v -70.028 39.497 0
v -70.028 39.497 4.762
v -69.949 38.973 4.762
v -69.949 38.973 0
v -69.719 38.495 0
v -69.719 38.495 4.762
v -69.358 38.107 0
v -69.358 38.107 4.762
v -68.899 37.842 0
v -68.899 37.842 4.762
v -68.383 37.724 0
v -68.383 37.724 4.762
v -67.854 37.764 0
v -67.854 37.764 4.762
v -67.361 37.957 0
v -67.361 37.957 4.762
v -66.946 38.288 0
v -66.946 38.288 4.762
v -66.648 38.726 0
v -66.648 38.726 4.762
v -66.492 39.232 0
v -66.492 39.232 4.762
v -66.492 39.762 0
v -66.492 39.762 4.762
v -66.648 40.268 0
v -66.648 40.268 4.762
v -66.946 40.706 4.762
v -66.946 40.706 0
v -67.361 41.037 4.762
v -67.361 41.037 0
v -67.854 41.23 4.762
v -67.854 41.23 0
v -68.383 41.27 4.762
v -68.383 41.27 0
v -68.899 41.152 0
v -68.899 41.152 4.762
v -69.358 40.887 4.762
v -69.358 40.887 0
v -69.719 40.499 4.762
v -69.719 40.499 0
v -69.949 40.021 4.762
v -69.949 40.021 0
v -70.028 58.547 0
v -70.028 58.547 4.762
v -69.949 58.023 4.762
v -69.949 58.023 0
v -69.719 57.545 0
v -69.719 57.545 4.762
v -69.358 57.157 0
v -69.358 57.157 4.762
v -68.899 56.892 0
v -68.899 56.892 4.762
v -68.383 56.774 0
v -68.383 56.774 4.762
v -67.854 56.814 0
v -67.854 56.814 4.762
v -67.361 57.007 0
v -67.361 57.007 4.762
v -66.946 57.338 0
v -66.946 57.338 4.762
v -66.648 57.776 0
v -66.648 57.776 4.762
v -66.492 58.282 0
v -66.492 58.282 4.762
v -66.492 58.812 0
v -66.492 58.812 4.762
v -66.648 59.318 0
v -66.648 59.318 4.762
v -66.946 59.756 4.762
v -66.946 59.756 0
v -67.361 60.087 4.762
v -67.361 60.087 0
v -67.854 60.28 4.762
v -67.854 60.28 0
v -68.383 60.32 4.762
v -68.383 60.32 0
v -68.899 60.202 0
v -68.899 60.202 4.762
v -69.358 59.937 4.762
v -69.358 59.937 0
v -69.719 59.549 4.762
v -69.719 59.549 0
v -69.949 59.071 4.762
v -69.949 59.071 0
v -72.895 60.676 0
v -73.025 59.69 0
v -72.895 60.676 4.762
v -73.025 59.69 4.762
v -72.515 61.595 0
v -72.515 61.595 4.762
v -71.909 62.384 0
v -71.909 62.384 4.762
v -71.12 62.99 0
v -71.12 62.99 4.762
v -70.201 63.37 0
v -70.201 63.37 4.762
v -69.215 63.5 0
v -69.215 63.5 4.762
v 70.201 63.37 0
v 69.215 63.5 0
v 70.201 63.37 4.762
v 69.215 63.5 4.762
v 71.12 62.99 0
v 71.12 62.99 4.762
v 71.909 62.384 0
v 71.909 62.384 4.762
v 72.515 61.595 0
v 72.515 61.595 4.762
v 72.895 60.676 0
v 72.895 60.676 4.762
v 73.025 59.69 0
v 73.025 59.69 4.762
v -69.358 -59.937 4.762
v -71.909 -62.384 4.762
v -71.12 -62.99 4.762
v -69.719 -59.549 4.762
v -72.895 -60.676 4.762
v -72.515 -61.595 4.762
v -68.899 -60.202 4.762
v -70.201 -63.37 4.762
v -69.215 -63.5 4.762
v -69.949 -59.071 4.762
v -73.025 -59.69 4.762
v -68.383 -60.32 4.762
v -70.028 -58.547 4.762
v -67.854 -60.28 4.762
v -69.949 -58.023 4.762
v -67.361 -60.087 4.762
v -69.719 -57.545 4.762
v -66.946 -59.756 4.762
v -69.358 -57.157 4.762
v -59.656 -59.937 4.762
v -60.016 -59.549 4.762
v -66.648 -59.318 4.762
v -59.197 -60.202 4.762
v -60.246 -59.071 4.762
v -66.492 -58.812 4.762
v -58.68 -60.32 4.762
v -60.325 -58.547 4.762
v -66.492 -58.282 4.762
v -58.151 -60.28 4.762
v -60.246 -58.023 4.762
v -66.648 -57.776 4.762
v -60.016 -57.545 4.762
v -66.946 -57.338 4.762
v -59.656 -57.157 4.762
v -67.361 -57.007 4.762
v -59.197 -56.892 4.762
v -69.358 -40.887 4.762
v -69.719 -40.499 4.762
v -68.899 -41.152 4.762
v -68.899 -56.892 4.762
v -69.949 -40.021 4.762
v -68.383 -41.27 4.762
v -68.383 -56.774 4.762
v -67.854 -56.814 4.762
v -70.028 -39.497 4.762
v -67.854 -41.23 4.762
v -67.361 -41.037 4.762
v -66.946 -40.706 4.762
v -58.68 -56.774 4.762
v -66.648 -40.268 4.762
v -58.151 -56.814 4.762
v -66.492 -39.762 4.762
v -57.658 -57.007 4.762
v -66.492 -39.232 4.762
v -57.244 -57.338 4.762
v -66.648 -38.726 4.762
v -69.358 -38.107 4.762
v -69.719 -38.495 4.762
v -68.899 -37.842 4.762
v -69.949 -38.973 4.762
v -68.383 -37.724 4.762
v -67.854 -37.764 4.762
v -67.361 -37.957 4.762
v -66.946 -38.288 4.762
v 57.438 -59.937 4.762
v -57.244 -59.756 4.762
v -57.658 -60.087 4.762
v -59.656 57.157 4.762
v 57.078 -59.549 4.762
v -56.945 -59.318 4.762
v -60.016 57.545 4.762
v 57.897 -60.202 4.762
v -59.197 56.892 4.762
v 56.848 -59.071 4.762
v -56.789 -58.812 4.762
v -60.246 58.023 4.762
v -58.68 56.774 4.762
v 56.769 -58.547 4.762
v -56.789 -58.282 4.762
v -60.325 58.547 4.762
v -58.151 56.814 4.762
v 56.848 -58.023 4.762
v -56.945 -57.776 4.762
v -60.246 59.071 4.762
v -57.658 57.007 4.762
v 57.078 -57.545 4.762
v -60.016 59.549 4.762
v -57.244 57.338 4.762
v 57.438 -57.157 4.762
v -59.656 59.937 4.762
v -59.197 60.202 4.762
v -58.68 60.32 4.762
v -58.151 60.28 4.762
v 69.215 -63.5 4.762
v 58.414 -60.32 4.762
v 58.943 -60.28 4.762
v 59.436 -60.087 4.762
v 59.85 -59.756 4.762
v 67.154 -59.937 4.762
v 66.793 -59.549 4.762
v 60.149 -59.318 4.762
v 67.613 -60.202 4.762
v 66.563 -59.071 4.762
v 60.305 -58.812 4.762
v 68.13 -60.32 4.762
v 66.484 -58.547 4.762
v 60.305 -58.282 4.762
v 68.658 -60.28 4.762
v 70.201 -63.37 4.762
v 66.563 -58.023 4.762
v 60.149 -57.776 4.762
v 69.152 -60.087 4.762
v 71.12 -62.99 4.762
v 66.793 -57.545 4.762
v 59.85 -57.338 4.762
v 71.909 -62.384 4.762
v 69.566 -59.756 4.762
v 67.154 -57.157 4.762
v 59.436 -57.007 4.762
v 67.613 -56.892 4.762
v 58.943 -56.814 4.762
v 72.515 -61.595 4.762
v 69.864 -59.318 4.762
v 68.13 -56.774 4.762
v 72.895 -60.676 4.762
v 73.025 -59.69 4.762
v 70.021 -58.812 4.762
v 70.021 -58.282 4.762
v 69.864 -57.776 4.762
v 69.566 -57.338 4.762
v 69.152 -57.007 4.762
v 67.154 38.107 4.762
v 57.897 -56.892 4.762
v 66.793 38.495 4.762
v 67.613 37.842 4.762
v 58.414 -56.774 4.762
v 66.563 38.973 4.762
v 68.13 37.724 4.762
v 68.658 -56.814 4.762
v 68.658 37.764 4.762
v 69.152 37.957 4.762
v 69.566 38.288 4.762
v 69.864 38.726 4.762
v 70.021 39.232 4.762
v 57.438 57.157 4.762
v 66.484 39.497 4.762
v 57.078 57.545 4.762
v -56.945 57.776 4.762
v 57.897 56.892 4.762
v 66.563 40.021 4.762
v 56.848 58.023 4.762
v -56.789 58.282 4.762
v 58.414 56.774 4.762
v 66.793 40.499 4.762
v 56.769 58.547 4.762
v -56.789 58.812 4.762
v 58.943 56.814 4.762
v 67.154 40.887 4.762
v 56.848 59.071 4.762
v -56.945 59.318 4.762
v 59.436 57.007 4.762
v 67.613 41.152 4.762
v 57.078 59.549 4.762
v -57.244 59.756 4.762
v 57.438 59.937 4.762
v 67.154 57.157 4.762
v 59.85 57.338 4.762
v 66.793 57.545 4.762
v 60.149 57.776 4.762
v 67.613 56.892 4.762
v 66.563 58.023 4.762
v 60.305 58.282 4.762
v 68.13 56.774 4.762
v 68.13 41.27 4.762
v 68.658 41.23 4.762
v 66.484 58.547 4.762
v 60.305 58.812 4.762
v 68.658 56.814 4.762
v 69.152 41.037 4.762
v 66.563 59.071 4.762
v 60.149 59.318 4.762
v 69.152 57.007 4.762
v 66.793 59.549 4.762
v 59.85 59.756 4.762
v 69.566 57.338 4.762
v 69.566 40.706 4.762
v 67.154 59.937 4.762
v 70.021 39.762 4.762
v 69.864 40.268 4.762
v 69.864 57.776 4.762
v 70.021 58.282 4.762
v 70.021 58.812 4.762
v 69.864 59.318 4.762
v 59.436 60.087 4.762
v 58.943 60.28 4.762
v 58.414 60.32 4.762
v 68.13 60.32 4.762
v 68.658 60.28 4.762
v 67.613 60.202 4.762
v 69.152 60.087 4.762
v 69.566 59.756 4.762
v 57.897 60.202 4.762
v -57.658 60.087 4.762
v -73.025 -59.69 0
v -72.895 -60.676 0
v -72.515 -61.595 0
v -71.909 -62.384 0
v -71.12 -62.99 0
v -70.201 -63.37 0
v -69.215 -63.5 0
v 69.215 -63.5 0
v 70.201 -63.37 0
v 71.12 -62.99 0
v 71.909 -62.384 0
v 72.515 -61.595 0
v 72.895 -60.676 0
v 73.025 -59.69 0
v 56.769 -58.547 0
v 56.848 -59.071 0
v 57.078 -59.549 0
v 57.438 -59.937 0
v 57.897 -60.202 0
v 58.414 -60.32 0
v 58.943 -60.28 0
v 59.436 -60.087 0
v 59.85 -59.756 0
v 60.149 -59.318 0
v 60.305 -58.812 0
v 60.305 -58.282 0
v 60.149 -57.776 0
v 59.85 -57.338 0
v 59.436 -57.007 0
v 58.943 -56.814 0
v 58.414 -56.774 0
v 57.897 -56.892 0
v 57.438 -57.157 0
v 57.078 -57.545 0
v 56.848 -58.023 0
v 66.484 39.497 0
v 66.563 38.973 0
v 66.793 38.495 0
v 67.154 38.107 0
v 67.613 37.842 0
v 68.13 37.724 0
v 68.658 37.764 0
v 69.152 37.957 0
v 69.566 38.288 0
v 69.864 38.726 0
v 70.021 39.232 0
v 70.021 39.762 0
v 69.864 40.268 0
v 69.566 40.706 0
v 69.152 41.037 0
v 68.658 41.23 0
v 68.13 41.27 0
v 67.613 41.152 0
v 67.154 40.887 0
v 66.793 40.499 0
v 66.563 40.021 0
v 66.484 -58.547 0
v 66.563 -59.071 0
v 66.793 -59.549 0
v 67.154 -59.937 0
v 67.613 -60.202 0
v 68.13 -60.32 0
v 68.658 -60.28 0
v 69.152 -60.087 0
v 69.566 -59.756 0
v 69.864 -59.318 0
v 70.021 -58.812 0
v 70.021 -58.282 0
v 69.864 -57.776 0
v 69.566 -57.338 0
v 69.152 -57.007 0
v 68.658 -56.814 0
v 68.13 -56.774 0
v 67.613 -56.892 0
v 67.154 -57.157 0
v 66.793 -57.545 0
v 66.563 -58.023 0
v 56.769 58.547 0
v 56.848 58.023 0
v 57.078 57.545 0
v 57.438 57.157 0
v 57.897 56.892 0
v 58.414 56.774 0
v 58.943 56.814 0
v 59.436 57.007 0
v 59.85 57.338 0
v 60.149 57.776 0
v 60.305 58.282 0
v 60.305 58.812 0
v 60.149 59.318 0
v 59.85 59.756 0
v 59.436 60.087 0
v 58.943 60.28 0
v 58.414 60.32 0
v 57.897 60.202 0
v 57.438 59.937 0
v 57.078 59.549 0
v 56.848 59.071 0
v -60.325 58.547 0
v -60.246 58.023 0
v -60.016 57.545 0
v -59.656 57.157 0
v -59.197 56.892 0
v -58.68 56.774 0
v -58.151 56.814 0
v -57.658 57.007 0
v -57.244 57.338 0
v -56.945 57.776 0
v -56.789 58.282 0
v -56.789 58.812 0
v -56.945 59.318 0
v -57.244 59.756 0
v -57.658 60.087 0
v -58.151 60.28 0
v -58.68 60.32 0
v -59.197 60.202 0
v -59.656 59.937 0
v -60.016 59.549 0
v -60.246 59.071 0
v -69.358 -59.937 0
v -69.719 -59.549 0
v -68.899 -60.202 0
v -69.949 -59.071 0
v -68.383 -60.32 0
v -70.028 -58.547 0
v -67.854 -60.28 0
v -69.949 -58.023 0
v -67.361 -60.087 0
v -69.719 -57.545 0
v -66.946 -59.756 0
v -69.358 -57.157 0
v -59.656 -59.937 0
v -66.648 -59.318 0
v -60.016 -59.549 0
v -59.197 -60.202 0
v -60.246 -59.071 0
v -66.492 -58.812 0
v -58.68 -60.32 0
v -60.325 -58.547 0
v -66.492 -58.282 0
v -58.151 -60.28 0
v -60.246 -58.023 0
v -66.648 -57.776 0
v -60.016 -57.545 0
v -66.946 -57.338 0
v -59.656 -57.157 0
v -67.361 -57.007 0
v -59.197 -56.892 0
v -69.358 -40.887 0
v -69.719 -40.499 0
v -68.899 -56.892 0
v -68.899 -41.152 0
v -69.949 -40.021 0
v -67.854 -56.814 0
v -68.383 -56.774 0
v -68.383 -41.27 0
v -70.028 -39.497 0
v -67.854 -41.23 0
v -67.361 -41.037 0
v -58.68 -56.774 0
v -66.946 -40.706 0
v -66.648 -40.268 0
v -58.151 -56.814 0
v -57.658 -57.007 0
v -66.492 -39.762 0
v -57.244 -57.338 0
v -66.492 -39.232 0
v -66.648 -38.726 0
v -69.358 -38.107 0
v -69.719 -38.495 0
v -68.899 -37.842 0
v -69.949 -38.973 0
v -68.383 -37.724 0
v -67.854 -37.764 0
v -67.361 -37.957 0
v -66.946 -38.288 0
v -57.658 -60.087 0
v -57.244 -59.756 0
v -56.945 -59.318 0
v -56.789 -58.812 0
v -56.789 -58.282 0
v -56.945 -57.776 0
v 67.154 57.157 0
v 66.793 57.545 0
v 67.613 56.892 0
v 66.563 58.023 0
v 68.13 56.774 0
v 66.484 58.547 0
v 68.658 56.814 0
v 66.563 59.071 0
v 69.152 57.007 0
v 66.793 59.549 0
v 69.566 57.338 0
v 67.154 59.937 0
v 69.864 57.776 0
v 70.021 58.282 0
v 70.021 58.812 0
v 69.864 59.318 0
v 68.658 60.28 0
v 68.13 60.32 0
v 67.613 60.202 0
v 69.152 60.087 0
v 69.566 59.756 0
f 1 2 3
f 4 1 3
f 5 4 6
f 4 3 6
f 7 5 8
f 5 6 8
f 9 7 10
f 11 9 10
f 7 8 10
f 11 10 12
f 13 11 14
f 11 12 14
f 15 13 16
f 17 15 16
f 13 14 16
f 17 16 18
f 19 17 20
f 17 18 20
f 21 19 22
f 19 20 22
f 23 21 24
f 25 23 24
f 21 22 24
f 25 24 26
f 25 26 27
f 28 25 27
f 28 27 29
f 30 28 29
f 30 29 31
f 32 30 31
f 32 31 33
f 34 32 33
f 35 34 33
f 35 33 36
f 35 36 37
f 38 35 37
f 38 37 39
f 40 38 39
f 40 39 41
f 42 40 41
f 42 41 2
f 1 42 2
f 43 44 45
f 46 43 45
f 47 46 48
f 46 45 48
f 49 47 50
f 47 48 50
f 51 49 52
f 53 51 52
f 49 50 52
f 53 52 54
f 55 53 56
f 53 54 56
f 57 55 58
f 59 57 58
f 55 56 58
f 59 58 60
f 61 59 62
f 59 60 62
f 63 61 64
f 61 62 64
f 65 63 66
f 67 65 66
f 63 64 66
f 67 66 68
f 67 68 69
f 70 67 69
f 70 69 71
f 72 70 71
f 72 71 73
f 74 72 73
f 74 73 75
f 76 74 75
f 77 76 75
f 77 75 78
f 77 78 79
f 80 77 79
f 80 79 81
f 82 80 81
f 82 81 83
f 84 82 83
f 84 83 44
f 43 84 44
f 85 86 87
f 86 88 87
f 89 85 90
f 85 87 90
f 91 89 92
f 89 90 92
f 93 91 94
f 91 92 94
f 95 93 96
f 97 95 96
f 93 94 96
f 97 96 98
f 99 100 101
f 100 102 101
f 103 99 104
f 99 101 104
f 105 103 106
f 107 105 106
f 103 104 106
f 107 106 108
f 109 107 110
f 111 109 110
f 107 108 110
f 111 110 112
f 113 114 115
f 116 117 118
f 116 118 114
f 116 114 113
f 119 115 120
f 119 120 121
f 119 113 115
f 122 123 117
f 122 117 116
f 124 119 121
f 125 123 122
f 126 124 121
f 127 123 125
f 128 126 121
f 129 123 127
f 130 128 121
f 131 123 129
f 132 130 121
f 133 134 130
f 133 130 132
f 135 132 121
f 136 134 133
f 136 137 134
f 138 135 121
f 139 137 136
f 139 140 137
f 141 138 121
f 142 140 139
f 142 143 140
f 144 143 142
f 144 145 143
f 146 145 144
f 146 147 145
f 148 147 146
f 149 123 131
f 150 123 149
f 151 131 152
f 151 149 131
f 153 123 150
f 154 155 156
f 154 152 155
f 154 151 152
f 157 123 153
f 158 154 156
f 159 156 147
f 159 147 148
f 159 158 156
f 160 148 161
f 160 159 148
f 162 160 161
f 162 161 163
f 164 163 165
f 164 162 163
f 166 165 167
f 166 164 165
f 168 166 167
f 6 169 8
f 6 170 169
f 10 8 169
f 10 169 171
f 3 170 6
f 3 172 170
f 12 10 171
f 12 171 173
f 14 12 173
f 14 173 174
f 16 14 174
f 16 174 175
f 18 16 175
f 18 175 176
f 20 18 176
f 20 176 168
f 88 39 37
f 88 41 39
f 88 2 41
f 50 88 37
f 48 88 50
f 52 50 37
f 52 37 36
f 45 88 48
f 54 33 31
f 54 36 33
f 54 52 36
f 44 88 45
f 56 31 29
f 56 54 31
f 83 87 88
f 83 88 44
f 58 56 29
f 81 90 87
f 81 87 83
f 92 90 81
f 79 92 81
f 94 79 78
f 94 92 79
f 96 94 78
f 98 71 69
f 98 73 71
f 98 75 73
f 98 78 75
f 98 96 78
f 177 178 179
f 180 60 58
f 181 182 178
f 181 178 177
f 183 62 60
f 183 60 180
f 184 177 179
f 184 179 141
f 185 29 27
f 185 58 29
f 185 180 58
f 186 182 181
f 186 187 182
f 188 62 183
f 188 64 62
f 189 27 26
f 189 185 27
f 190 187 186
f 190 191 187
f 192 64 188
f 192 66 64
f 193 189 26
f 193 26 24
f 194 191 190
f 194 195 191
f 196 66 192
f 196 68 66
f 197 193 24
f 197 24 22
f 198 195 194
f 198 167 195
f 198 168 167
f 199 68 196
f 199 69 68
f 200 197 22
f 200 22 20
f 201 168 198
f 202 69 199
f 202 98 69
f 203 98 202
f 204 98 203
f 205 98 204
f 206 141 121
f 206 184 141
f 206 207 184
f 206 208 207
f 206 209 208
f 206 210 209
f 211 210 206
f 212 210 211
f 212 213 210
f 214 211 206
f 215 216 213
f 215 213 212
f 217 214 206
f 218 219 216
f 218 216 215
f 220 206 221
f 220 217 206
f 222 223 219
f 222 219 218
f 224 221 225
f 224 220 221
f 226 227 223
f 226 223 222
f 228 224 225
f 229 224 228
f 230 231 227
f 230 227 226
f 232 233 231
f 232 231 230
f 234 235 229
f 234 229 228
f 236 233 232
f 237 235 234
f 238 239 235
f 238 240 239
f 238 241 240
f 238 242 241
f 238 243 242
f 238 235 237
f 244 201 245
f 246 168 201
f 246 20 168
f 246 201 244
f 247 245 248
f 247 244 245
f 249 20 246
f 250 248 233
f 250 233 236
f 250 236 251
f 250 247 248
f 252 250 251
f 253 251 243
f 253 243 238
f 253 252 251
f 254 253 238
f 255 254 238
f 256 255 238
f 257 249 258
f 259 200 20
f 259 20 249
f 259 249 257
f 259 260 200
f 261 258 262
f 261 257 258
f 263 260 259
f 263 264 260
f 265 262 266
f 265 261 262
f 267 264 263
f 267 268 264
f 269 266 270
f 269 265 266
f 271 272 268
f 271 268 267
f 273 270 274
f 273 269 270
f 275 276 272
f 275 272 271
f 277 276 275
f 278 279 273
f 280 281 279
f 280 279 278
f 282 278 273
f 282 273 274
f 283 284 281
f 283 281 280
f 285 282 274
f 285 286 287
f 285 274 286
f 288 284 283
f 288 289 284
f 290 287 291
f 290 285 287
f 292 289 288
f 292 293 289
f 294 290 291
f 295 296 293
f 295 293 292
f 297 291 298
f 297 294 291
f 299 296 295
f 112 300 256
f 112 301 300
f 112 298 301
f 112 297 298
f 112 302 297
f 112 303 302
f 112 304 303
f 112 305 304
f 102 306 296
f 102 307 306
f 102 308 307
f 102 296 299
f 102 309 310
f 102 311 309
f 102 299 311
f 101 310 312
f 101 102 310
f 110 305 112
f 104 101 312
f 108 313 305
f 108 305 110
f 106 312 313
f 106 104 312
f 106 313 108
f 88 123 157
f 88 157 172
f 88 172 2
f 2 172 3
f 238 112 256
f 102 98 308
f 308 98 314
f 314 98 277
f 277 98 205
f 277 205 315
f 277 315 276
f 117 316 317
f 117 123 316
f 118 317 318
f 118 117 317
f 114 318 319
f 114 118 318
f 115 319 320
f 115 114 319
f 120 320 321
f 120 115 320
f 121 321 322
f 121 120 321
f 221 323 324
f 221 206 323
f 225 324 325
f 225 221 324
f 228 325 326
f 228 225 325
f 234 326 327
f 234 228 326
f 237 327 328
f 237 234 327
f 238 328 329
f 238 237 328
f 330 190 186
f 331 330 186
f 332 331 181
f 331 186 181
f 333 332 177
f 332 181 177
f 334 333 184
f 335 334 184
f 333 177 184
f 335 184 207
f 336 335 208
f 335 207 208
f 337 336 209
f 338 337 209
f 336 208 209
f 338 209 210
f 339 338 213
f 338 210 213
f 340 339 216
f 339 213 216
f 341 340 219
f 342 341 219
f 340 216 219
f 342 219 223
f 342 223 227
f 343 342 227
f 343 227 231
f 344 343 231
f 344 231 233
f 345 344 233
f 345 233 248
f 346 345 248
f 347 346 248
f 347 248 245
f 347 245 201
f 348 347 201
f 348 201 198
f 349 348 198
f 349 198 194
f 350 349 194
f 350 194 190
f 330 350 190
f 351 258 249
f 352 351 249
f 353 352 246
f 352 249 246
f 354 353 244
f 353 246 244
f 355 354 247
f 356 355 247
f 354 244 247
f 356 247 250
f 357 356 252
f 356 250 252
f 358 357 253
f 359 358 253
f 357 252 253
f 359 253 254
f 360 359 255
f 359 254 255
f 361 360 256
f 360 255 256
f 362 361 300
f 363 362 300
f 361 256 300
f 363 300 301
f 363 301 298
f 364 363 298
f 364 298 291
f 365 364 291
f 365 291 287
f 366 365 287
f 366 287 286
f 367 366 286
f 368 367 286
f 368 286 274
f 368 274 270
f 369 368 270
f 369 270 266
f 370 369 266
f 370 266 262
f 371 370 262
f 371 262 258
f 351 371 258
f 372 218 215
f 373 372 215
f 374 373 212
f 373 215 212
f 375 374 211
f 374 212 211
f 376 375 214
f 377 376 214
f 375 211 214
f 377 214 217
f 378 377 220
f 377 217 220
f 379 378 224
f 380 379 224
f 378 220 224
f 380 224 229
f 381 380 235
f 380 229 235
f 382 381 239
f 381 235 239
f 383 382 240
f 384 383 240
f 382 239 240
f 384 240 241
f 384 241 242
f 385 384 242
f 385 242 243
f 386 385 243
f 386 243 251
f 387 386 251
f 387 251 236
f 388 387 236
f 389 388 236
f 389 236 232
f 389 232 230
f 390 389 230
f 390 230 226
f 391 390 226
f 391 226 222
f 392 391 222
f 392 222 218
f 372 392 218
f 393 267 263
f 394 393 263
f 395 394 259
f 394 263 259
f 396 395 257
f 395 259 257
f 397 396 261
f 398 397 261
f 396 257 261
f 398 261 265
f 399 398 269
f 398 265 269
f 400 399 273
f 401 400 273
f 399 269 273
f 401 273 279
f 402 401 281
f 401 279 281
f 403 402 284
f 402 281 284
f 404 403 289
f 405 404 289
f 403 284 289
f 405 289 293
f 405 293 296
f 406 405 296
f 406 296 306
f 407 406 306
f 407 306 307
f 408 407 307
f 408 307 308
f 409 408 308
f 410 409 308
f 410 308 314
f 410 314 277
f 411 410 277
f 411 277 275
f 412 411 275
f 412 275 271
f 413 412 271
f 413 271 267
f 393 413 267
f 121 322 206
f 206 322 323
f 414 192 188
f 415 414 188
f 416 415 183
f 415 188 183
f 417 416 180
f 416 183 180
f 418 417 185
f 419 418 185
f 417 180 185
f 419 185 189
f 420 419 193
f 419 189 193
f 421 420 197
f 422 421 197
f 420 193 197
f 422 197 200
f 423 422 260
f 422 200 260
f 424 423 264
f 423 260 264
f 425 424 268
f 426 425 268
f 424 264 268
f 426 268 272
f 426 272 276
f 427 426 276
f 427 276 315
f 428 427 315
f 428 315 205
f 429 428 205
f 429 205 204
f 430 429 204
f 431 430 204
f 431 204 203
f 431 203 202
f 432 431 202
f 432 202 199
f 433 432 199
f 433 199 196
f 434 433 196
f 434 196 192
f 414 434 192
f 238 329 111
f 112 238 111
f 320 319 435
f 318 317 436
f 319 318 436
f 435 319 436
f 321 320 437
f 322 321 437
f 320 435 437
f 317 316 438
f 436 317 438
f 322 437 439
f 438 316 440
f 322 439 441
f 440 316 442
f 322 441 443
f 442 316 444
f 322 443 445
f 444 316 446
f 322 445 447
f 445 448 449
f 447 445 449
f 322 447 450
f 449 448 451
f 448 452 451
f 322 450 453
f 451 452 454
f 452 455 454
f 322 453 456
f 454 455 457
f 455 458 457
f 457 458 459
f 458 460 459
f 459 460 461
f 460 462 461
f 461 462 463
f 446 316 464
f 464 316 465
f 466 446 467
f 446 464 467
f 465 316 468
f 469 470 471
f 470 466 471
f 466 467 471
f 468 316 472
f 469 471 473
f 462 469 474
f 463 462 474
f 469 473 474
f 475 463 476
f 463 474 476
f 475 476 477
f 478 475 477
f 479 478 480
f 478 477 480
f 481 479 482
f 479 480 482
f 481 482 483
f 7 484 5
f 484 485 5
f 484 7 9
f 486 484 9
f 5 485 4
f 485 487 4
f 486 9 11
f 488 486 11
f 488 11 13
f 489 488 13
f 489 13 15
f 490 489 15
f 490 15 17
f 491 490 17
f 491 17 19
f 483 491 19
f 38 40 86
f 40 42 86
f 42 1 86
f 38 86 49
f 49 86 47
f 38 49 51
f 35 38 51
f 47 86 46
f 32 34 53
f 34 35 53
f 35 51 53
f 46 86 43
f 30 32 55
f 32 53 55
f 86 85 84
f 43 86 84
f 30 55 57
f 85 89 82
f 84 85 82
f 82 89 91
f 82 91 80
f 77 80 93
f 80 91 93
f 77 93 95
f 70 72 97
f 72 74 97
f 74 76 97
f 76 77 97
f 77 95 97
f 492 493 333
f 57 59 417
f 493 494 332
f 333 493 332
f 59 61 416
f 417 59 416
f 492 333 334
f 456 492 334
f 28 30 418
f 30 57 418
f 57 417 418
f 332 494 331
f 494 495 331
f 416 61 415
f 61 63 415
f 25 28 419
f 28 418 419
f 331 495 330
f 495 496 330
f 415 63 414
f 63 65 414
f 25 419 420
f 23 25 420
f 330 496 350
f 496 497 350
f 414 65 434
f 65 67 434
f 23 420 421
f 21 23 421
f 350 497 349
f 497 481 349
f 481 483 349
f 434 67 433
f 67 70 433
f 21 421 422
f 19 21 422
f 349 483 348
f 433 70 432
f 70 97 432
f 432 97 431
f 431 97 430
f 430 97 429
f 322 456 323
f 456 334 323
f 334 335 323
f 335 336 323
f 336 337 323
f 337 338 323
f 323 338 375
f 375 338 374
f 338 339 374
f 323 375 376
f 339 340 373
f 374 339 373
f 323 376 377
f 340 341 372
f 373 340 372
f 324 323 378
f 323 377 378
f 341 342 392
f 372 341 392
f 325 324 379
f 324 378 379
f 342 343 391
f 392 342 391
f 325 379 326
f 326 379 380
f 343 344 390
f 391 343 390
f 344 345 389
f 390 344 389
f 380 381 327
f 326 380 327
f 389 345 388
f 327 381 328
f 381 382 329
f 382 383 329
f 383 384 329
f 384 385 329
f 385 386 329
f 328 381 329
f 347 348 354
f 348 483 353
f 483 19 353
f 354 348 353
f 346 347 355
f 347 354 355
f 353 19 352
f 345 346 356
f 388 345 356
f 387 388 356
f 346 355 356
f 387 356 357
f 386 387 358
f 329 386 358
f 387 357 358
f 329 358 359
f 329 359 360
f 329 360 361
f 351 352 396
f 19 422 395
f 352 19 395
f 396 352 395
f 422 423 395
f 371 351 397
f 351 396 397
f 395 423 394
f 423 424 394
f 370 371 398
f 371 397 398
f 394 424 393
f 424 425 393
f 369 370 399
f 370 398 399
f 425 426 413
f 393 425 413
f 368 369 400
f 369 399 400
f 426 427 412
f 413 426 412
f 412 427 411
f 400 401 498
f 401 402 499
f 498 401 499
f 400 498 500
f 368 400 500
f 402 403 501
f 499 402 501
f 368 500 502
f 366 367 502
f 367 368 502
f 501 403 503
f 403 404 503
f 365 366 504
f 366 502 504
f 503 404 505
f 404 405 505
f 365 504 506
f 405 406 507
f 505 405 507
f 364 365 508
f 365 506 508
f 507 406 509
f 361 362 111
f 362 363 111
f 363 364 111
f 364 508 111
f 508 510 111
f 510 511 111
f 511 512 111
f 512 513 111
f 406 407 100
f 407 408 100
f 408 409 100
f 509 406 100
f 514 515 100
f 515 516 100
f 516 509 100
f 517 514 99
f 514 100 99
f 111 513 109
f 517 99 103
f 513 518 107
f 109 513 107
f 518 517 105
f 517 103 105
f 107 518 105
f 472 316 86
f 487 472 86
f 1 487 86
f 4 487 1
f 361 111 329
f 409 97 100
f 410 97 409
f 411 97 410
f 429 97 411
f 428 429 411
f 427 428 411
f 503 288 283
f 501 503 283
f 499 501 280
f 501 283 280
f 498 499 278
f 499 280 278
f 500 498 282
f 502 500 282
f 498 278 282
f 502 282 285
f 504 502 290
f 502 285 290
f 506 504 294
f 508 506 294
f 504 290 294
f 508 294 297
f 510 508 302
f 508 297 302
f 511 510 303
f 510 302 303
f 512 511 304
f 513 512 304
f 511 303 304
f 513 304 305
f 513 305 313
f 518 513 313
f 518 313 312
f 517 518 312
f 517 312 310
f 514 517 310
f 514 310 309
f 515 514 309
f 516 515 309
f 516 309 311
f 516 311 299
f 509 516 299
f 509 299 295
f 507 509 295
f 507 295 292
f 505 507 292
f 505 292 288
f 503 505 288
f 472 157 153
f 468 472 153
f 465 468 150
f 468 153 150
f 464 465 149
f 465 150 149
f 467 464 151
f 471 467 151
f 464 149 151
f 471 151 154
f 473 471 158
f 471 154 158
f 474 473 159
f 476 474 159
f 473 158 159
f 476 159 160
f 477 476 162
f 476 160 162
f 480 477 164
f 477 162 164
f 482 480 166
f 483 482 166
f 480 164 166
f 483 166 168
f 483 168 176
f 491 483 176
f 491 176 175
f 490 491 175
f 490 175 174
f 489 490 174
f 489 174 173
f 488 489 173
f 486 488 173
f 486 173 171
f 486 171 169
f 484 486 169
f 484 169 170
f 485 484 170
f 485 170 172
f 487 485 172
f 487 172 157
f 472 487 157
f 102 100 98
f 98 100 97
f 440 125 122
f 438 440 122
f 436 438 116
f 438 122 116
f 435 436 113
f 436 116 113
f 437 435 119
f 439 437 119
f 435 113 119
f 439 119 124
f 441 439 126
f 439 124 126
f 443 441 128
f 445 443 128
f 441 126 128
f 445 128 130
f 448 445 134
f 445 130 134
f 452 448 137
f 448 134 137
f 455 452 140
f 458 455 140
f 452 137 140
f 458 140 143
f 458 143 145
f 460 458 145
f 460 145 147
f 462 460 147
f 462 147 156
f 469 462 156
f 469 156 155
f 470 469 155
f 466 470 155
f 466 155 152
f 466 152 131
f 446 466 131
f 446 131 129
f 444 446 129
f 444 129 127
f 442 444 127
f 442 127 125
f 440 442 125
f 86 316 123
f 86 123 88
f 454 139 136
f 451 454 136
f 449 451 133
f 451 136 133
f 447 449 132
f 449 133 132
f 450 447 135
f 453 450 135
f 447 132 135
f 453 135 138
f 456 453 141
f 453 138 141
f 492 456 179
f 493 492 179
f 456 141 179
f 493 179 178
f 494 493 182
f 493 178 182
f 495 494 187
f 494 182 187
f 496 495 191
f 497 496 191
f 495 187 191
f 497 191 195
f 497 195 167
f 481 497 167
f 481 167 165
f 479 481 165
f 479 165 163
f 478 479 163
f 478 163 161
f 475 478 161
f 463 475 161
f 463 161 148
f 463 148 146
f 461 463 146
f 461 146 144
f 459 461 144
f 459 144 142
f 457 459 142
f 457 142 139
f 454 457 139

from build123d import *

# Parameters (mm, degrees)
F0_W     = 127
F0_H     = 127
F0_W_2   = 9.525
F1_DEPTH = 4.7625
F2_D     = 3.556
F3_R     = 3.81


with BuildPart() as f1:
    # F0 (on Top) → F1 (new body)
    with BuildSketch(Plane.XY):
        Rectangle(F0_W, F0_H)
        with Locations((-68.2625, 0)):
            Rectangle(F0_W_2, F0_H)
        with Locations((68.2625, 0)):
            Rectangle(F0_W_2, F0_H)
    extrude(amount=F1_DEPTH)

    # F2 (through all)
    with Locations(Plane(origin=(0, 0, 0), x_dir=(1, 0, 0), z_dir=(0, 0, -1))):
        with Locations((-68.2498, -58.547), (-58.547, -58.547), (-68.2498, -39.497), (-68.2498, 39.497), (-68.2498, 58.547), (-58.547, 58.547), (58.547, 58.547), (68.2625, 58.547), (68.2625, -58.547), (68.2625, -39.497), (58.547, -58.547)):
            Hole(F2_D / 2)

    # F3
    f3_edges = [f1.edges().sort_by_distance(p)[0] for p in [
        (-73.025, 63.5, 2.38125),
        (-73.025, -63.5, 2.38125),
        (73.025, -63.5, 2.38125),
        (73.025, 63.5, 2.38125),
    ]]
    fillet(f3_edges, radius=F3_R)


solid = f1.part
